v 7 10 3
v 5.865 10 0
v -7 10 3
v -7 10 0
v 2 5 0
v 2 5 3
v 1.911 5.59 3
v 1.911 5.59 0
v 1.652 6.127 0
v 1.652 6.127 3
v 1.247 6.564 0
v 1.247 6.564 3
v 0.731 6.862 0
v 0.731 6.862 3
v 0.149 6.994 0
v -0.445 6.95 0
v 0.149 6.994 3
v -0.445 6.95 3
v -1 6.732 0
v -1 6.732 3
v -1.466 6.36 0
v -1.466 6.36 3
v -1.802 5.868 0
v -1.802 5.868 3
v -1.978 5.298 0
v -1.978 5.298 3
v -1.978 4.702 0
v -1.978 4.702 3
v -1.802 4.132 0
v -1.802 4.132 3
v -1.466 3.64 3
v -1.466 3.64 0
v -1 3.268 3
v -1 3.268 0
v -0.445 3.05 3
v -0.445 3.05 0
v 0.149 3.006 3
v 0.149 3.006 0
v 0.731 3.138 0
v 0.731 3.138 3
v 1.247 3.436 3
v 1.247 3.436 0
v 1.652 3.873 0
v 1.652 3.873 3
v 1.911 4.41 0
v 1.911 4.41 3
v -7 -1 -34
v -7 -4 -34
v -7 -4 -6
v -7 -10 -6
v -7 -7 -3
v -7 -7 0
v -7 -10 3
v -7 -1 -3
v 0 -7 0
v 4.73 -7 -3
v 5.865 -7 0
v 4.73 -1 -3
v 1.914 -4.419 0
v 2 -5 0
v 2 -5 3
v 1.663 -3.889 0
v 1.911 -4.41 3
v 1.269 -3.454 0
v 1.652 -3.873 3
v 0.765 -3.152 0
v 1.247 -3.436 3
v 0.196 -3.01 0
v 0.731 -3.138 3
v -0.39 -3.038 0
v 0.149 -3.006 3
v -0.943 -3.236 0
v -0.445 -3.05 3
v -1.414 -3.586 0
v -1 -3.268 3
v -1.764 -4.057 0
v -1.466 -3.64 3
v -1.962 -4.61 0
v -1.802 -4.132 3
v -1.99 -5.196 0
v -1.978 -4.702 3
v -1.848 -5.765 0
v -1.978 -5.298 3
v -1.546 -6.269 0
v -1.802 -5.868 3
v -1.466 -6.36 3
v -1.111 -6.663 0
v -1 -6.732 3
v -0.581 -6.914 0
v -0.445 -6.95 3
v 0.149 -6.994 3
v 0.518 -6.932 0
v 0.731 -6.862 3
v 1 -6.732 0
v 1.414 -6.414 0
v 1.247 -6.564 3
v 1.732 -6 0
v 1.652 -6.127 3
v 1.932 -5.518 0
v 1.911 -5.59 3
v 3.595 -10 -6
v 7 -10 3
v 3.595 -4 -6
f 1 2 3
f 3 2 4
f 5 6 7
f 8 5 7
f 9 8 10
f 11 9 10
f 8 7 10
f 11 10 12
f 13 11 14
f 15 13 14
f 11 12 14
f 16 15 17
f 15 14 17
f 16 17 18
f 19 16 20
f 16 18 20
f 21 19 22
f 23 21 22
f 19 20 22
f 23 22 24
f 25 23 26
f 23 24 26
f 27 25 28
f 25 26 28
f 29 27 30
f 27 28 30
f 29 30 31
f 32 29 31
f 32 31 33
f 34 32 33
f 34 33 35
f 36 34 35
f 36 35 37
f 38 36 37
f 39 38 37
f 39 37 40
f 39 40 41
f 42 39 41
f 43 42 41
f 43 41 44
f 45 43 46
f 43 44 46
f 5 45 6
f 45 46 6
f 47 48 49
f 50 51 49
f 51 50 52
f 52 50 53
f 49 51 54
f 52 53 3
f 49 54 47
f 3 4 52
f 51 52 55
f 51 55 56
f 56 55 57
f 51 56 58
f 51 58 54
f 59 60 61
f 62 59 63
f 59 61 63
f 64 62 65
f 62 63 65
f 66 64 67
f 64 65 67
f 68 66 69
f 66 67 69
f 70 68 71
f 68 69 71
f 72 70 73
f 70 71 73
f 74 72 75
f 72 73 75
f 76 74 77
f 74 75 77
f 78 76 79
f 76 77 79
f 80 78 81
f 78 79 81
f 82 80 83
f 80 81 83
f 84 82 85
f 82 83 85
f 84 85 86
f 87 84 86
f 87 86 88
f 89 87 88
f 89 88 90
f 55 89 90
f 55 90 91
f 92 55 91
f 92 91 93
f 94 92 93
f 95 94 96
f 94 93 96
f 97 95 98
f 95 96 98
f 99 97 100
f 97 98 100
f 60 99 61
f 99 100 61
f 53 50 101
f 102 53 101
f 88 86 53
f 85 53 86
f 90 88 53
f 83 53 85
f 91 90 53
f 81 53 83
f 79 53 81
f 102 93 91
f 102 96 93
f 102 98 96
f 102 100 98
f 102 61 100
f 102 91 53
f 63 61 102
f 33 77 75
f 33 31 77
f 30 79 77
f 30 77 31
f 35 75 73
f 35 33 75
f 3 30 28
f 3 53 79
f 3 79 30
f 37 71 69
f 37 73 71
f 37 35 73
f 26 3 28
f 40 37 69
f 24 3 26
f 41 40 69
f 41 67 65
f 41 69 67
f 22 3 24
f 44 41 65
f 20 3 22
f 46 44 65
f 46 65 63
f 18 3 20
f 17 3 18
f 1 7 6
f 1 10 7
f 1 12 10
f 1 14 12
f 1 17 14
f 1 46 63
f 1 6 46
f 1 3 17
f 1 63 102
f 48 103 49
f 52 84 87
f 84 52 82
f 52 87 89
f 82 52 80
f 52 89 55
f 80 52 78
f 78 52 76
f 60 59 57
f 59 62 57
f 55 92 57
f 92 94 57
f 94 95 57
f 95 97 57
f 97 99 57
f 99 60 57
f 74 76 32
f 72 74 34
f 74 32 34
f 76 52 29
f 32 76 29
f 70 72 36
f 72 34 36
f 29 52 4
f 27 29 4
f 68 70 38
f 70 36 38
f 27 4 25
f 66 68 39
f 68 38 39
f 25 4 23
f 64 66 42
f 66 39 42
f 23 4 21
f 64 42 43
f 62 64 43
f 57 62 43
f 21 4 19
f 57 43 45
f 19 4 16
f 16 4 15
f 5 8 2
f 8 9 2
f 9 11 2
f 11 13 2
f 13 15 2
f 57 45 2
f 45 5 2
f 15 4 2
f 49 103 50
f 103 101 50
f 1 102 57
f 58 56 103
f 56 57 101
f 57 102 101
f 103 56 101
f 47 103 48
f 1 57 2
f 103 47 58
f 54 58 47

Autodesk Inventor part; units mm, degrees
ref_plane "YZ Plane" through (0, 0, 0) normal (1, 0, 0) x (0, 1, 0)
ref_plane "XZ Plane" through (0, 0, 0) normal (0, 1, 0) x (-1, 0, 0)
ref_plane "XY Plane" through (0, 0, 0) normal (0, 0, 1) x (1, 0, 0)
sketch "Эскиз1" plane through (0, 0, 0) normal (0, 0, 1) x (1, 0, 0)
  line L0 (-7, -10) -> (7, -10)
  line L1 (7, -10) -> (7, 10)
  line L2 (7, 10) -> (-7, 10)
  line L3 (-7, 10) -> (-7, -10)
  line L4 (-7, -10) -> (7, 10) construction
  line L5 (7, -10) -> (-7, 10) construction
  point P0 (0, 0)
  dimension "d0" = 14
  dimension "d1" = 20
extrude "Выдавливание1" add sketch "Эскиз1" along normal blind 3
sketch "Эскиз2" plane through (0, 0, 0) normal (0, 0, -1) x (-1, 0, 0)
  line L0 (7, -10) -> (-7, -10) projected
  line L1 (7, 10) -> (7, -10) projected
  line L2 (-7, 10) -> (7, 10) projected
  line L3 (-7, -10) -> (-7, 10) projected
  line L4 (7, -10) -> (7, -7)
  line L5 (7, 10) -> (7, -10) construction
  line L6 (7, -10) -> (-7, -10) projected
  line L7 (7, -7) -> (-7, -7)
  line L8 (-7, -7) -> (-7, -10)
  line L9 (-7, -10) -> (7, -10)
  line L10 (7, -10) -> (7, -7)
  point P0 (0, 0)
  dimension "d4" = 3
extrude "Выдавливание2" add sketch "Эскиз2" along normal blind 6 contours L0 L3 L7 L1
sketch "Эскиз3" plane through (-7, -7, 0) normal (0, 1, 0) x (1, 0, 0)
  line L0 (14, 6) -> (0, 6) projected
  line L1 (14, 0) -> (0, 0) projected
  line L2 (14, 0) -> (14, 6) projected
  line L3 (0, 6) -> (14, 6) projected
  line L4 (0, 0) -> (0, 6) projected
  line L5 (14, 6) -> (14, 3) construction
  line L6 (14, 0) -> (14, 6) construction
  line L7 (14, 3) -> (0, 3)
  line L8 (0, 3) -> (0, 6)
  line L9 (0, 6) -> (14, 6)
  line L10 (14, 6) -> (14, 3)
  point P0 (7, 0)
  dimension "d7" = 3
extrude "Выдавливание3" add sketch "Эскиз3" along normal blind 6 contours L2 L7 L4 L0
sketch "Эскиз4" plane through (0, 0, -6) normal (0, 0, -1) x (-1, 0, 0)
  line L0 (-7, -10) -> (7, -10) projected
  line L1 (7, -10) -> (7, -1) projected
  line L2 (-7, -1) -> (7, -1) projected
  line L3 (-7, -10) -> (-7, -1) projected
  line L4 (-7, -1) -> (7, -1) construction
  line L5 (-7, -1) -> (-7, -4) construction
  line L6 (-7, -4) -> (7, -4)
  line L7 (7, -4) -> (7, -1)
  line L8 (7, -1) -> (-7, -1)
  line L9 (-7, -1) -> (-7, -4)
  point P0 (0, 0)
  dimension "d10" = 3
extrude "Выдавливание4" add sketch "Эскиз4" along normal blind 28 contours L3 L2 L1 L6
sketch "Эскиз6" plane through (0, 0, 3) normal (0, 0, 1) x (1, 0, 0)
  line L0 (-7, -10) -> (7, -10) projected
  line L1 (7, -10) -> (7, 10) projected
  line L2 (7, 10) -> (-7, 10) projected
  line L3 (-7, 0) -> (7, 0) construction
  line L4 (7, -7) -> (7, 10) construction
  line L5 (7, 10) -> (-7, 10) construction
  line L6 (0, 10) -> (0, -10) construction
  line L7 (0, 0) -> (0, 10) construction
  line L8 (0, 5) -> (-7, 5) construction
  line L9 (-7, 10) -> (-7, -10) construction
  line L10 (0, 5) -> (7, 5) construction
  line L11 (0, -10) -> (0, 0) construction
  line L12 (0, -5) -> (7, -5) construction
  circle A0 centre (0, 5) radius 2
  circle A1 centre (0, -5) radius 2
  line L13 (-7, 10) -> (-7, -10) projected
  point P0 (-5.8649, 10)
  dimension "d15" = 4
  dimension "d16" = 4
extrude "Выдавливание6" cut sketch "Эскиз6" against normal up to surface (6 mm away) contours A0 | A1
sketch "Эскиз7" plane through (-7, -10, 3) normal (0, -1, 0) x (1, 0, 0)
  line L0 (14, -9) -> (14, 0) projected
  line L1 (0, 0) -> (14, 0) projected
  line L2 (0, 0) -> (0, -9) projected
  line L3 (14, -9) -> (0, -9) projected
  line L4 (0, -9) -> (14, -9) projected
  line L5 (0, -9) -> (0, -37) projected
  line L6 (14, -37) -> (0, -37) projected
  line L7 (14, -9) -> (14, -37) projected
  line L8 (0, 0) -> (14, 0) projected
  line L9 (0, -6) -> (0, -37) projected
  line L10 (14, 0) -> (0, -37)
  line L11 (0, -37) -> (14, -37)
  line L12 (14, -9) -> (14, 0) projected
  line L13 (14, 0) -> (14, -37)
  point P0 (7, -3)
extrude "Выдавливание7" cut sketch "Эскиз7" against normal blind 28 contours L3 L10 L0 | L7 L6 L10 L3
properties part number "Side control"
